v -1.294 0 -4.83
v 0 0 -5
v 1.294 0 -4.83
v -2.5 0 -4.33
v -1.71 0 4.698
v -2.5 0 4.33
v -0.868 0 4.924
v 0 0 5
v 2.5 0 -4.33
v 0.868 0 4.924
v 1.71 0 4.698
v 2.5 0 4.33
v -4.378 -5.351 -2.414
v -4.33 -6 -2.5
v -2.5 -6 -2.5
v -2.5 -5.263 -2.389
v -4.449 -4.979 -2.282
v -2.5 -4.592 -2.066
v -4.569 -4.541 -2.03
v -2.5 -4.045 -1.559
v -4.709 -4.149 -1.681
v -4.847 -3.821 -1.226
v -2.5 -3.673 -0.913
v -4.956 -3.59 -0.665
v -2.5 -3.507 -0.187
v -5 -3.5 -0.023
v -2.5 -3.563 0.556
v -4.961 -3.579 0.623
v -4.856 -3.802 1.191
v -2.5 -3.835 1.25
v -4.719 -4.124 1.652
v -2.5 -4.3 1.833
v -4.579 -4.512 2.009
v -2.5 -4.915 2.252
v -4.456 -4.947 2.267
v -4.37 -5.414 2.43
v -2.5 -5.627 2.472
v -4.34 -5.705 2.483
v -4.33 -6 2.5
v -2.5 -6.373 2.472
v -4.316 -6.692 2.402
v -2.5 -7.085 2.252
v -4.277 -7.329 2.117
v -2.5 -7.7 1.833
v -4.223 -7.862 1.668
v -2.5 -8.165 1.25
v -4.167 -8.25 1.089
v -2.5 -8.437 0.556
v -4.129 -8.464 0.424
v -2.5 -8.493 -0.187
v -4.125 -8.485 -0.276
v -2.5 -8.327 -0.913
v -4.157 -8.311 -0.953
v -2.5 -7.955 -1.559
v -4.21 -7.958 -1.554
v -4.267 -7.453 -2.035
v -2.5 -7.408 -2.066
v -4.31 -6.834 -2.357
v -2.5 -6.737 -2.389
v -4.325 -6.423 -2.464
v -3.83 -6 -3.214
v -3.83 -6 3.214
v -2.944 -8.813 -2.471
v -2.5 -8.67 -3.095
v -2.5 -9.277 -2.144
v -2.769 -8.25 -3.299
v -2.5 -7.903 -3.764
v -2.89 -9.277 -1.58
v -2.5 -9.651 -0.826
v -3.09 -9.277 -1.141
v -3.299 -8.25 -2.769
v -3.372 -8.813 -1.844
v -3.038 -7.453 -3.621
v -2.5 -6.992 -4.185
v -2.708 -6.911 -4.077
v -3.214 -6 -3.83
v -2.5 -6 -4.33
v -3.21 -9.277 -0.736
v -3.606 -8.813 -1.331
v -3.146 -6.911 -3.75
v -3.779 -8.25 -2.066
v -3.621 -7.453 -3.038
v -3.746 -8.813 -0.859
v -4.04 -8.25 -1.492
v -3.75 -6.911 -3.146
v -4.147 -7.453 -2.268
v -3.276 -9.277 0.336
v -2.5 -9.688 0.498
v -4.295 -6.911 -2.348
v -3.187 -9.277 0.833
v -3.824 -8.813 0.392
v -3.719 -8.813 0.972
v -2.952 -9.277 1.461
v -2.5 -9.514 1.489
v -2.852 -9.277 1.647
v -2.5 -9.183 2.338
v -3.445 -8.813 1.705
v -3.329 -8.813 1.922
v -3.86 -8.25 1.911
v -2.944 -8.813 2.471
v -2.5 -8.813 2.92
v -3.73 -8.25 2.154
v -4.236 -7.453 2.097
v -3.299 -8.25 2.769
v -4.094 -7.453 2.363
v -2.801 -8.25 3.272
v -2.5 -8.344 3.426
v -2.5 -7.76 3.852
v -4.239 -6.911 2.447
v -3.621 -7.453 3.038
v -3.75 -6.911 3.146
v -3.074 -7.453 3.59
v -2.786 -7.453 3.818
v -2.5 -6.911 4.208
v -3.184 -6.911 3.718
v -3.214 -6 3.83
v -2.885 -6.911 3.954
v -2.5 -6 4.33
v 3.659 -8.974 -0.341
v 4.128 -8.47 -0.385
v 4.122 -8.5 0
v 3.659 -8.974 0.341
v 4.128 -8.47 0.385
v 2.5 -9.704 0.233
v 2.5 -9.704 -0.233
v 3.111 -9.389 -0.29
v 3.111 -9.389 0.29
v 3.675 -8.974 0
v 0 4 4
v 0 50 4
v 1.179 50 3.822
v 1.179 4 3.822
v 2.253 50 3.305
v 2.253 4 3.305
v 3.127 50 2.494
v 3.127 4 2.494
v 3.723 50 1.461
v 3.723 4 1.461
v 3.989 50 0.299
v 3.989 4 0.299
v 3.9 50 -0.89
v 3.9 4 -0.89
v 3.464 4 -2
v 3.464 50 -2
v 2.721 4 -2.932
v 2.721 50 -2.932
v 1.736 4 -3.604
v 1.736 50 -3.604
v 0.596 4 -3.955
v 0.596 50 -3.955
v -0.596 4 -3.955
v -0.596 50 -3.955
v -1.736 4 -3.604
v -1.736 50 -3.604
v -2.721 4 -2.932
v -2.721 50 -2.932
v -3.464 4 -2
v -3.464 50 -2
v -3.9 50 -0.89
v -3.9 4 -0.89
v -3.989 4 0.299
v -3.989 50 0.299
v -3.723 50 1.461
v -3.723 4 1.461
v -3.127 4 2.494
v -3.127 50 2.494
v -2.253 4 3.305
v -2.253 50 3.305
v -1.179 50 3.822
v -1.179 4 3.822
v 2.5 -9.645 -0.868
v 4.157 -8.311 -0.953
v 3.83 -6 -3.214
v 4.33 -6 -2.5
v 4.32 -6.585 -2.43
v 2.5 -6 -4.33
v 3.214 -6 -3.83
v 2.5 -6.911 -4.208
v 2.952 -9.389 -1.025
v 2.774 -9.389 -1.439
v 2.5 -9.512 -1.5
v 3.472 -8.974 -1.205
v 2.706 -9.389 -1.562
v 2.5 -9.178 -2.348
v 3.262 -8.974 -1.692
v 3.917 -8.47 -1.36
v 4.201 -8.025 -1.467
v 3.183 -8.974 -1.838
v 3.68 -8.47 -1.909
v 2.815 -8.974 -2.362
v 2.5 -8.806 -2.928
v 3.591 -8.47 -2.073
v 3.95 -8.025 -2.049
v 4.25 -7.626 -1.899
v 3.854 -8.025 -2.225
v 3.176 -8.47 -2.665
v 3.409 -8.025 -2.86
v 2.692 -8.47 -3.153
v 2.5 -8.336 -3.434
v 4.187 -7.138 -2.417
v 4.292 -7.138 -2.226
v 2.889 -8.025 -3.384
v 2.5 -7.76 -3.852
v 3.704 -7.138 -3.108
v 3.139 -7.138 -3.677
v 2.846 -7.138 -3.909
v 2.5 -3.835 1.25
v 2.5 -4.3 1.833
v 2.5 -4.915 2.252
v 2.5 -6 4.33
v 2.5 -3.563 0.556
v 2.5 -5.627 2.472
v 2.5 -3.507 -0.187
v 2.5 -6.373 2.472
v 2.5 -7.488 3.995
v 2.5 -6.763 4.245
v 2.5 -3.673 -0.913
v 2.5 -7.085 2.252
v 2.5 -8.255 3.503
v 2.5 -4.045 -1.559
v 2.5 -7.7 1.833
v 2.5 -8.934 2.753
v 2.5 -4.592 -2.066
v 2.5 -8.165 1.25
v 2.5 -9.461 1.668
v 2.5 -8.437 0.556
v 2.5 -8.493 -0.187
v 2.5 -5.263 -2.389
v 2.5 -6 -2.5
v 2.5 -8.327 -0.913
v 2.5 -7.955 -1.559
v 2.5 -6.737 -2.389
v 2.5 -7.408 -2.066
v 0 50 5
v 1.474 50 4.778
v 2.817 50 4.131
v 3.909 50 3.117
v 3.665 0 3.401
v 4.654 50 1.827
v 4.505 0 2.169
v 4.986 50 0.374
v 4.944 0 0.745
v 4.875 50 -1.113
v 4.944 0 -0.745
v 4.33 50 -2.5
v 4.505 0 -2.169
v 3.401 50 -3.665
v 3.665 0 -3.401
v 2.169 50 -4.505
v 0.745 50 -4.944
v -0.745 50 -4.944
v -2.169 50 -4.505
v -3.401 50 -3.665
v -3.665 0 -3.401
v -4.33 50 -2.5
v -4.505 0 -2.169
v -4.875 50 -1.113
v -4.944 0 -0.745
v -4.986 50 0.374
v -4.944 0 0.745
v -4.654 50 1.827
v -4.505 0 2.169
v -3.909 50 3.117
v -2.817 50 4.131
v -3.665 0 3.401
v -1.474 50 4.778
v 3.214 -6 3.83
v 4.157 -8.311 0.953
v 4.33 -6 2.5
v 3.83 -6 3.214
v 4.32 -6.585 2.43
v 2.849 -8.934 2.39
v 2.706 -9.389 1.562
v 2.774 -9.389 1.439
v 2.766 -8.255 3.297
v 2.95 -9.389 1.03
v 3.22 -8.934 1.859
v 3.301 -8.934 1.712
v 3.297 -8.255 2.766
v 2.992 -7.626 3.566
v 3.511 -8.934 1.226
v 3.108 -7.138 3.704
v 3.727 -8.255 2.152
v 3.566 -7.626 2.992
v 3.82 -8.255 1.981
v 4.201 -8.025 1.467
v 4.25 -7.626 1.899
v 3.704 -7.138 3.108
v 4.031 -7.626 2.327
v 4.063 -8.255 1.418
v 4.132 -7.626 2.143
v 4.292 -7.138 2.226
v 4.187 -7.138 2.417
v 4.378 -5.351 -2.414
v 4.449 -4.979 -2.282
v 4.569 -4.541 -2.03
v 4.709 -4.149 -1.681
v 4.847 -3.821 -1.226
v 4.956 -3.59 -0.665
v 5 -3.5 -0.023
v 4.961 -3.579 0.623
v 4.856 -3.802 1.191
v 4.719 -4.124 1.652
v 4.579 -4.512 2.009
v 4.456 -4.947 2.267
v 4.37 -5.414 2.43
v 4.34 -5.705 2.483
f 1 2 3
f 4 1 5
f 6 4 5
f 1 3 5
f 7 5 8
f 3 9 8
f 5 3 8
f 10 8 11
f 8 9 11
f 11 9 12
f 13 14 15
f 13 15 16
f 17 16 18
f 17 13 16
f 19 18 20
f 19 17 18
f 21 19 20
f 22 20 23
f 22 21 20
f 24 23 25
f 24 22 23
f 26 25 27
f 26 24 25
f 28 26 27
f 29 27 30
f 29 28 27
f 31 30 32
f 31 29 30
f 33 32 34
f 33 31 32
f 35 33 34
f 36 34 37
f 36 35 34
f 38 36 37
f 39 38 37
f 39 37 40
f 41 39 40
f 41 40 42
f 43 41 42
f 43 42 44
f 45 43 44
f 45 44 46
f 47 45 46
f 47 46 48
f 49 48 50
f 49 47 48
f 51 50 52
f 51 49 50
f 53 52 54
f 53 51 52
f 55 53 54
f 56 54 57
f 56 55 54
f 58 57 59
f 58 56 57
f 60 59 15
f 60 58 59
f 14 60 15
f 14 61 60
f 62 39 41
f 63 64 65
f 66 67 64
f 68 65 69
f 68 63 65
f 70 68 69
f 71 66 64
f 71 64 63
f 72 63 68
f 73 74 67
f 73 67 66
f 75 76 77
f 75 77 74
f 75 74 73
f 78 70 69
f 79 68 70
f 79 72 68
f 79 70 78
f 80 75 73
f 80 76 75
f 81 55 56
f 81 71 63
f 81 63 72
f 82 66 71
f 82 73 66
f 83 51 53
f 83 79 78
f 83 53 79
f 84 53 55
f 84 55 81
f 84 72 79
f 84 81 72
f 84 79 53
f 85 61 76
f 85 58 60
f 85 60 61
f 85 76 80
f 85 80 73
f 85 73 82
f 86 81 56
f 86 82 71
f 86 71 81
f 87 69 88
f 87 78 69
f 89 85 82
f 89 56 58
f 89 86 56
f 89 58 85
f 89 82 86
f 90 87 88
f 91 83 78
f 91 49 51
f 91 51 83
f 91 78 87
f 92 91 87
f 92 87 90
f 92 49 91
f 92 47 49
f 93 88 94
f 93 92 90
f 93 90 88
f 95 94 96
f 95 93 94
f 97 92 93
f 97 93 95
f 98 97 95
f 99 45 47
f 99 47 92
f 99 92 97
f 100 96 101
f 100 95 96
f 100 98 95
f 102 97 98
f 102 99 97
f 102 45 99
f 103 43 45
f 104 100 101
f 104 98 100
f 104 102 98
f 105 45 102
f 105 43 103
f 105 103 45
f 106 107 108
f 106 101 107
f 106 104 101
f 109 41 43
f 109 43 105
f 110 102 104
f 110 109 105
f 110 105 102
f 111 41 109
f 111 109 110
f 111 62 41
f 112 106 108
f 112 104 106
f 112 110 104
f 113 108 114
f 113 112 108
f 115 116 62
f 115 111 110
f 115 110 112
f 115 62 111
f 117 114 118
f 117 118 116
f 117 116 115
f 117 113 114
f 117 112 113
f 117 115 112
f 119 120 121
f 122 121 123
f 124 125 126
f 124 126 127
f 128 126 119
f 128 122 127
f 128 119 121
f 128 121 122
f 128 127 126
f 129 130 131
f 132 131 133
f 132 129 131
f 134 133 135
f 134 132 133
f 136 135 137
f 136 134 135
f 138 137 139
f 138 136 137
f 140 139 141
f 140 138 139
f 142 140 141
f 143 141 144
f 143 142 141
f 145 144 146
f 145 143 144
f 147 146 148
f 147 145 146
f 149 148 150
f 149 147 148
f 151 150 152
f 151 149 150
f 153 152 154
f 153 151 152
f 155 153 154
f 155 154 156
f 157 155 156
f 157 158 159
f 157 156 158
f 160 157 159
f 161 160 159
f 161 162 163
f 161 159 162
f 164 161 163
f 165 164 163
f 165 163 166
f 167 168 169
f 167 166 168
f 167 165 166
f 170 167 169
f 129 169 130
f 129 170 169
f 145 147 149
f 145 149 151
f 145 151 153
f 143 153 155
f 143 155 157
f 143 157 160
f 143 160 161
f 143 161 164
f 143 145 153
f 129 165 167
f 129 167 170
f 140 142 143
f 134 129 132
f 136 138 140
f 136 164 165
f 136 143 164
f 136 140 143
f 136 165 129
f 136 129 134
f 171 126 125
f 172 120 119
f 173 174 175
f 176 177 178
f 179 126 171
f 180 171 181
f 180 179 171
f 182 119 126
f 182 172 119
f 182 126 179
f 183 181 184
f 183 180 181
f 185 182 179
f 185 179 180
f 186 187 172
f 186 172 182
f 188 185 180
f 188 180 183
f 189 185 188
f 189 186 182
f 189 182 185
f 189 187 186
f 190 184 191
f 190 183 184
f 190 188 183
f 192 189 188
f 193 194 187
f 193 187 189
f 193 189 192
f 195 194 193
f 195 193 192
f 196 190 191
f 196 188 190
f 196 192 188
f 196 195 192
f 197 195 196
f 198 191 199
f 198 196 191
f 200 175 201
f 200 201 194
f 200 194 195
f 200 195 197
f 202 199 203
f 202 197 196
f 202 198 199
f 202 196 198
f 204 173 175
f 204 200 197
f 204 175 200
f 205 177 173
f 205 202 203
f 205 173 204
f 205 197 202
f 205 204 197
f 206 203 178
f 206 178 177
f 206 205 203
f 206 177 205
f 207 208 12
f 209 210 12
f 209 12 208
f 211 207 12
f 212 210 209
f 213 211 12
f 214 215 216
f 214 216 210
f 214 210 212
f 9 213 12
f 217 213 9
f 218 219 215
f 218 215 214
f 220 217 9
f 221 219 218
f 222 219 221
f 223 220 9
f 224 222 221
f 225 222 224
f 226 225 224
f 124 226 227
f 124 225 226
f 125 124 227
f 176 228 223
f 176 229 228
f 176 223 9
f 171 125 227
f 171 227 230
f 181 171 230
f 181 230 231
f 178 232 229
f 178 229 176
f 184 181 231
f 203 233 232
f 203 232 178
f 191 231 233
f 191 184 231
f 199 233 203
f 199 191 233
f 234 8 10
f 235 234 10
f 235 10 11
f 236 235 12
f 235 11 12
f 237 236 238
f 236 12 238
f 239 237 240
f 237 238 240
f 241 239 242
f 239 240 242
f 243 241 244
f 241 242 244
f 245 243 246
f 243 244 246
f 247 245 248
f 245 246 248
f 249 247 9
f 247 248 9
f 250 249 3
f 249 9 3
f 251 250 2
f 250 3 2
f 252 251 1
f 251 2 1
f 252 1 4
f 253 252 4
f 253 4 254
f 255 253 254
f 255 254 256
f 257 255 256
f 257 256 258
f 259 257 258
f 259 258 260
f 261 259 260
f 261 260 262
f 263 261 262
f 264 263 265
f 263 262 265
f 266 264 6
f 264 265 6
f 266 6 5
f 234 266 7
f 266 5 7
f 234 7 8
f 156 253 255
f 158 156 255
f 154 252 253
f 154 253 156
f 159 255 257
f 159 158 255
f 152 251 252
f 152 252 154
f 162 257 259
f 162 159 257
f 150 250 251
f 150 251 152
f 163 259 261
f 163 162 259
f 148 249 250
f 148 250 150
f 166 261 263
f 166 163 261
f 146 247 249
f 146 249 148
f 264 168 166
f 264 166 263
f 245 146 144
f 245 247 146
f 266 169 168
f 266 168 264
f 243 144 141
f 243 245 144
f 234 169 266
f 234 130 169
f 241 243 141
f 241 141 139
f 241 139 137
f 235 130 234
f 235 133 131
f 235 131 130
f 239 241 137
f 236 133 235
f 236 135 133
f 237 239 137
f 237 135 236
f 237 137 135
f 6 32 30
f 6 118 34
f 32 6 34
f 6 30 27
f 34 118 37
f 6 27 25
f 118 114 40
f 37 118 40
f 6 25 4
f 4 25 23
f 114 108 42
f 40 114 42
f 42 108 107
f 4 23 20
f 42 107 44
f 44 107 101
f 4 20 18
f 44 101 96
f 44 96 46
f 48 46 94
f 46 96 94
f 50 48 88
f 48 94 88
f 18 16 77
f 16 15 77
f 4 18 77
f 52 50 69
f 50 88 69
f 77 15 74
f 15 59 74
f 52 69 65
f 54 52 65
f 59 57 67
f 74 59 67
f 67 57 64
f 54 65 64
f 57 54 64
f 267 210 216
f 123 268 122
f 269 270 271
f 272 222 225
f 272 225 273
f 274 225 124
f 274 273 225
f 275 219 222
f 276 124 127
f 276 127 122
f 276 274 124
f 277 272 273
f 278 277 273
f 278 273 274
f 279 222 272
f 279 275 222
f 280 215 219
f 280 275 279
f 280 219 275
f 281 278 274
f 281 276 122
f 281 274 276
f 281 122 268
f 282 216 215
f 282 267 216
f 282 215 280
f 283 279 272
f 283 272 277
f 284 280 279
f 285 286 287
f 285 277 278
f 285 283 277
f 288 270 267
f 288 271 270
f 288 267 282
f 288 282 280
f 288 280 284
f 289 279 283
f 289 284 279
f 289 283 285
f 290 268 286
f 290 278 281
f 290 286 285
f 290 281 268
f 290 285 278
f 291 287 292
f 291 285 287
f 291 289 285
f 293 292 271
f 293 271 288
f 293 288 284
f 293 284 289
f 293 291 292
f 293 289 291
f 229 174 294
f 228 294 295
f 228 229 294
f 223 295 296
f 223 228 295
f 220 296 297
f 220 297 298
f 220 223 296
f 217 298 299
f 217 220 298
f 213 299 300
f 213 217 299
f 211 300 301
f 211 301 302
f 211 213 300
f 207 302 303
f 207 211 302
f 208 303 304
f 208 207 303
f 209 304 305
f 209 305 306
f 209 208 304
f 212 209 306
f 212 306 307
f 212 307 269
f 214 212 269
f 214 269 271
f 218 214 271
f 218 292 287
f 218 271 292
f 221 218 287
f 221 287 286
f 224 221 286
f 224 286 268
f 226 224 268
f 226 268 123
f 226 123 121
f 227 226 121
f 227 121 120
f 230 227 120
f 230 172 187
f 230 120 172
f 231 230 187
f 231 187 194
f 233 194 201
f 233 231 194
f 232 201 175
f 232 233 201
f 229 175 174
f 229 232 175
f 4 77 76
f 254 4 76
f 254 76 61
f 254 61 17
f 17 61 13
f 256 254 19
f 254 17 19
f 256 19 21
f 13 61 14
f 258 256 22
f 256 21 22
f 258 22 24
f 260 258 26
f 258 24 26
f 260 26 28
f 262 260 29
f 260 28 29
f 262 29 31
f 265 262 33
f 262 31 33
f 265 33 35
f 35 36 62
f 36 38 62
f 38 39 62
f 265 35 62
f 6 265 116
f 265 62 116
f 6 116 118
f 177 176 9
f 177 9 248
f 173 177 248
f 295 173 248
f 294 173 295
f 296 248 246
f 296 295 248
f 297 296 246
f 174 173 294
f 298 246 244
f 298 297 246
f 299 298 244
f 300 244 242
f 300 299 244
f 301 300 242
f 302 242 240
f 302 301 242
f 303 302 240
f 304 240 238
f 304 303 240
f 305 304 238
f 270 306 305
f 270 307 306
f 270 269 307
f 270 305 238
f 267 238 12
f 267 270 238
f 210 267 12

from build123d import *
from build123d.topology import SkipClean

# Parameters (mm, degrees)
SKETCH1_R               = 5
BOSS_EXTRUDE1_DEPTH     = 50
CUT_EXTRUDE1_START      = 4
SKETCH1_3_R             = 4
CUT_EXTRUDE1_DEPTH      = 50
BOSS_EXTRUDE2_START     = 10
BOSS_EXTRUDE2_DEPTH     = 10
FILLET3_R               = 4
CUT_EXTRUDE2_DEPTH      = 51.806003597
CUT_EXTRUDE2_DEPTH_BACK = 51.806003597
SKETCH3_R               = 2.5


with BuildPart() as part:
    # Sketch1 → Boss-Extrude1 (new body)
    with BuildSketch(Plane(origin=(0, 0, 0), x_dir=(1, 0, 0), z_dir=(0, 1, 0))):
        with Locations(Location((0, 0, 0), (0, 0, 270))):
            Circle(SKETCH1_R)
    extrude(amount=BOSS_EXTRUDE1_DEPTH)

    # Sketch1<3> → Cut-Extrude1 (cut)
    with BuildSketch(Plane(origin=(0, 0, 0), x_dir=(1, 0, 0), z_dir=(0, 1, 0)).offset(CUT_EXTRUDE1_START)):
        with Locations(Location((0, 0, 0), (0, 0, 270))):
            Circle(SKETCH1_3_R)
    extrude(amount=CUT_EXTRUDE1_DEPTH, mode=Mode.SUBTRACT)

    # Sketch2 → Boss-Extrude2 (add)
    with SkipClean():  # the faces are left unmerged after this step: merging them gives an invalid solid
        with BuildSketch(Plane.XZ.offset(BOSS_EXTRUDE2_START)):
            with BuildLine():
                Line((-2.5, 4.330127019), (-2.5, -4.330127019))
                ThreePointArc((-2.5, -4.330127019), (-5, 0), (-2.5, 4.330127019))
            make_face()
            with BuildLine():
                Line((2.5, 4.330127019), (2.5, -4.330127019))
                ThreePointArc((2.5, -4.330127019), (5, 0), (2.5, 4.330127019))
            make_face()
        extrude(amount=-BOSS_EXTRUDE2_DEPTH)

    # Fillet3
    # the kernel refuses this fillet: 4 mm, written as the material it takes off along each edge
    with BuildSketch(Plane(origin=(0, -10, 0), x_dir=(0.9956817269656716, 0, -0.09283263750781805), z_dir=(0.09283263750781805, 0, 0.9956817269656716))) as fillet3_piece_1:
        with BuildLine():
            CenterArc((5 - FILLET3_R, FILLET3_R), FILLET3_R, 270, 90)
            Line((5 - FILLET3_R, 0), (5, 0))
            Line((5, 0), (5, FILLET3_R))
        make_face()
    revolve(axis=Axis((0, -10, 0), (0, 1, 0)), revolution_arc=349.34682448, mode=Mode.SUBTRACT)
    with BuildSketch(Plane(origin=(0, -10, 0), x_dir=(-0.9956817269656714, 0, -0.09283263750781937), z_dir=(-0.09283263750781937, 0, 0.9956817269656714))) as fillet3_piece_2:
        with BuildLine():
            CenterArc((5 - FILLET3_R, -FILLET3_R), FILLET3_R, 0, 90)
            Line((5 - FILLET3_R, 0), (5, 0))
            Line((5, 0), (5, -FILLET3_R))
        make_face()
    revolve(axis=Axis((0, -10, 0), (0, -1, 0)), revolution_arc=349.34682448, mode=Mode.SUBTRACT)

    # Sketch3 → Cut-Extrude2 (cut, two sides: drawn at the far end of the back side and taken through both)
    with BuildSketch(Plane(origin=(-2.5, 0, 0), x_dir=(0, 0, -1), z_dir=(1, 0, 0)).offset(-CUT_EXTRUDE2_DEPTH_BACK)):
        with Locations((0, -6)):
            Circle(SKETCH3_R)
    extrude(amount=CUT_EXTRUDE2_DEPTH + CUT_EXTRUDE2_DEPTH_BACK, mode=Mode.SUBTRACT)


solid = part.part
